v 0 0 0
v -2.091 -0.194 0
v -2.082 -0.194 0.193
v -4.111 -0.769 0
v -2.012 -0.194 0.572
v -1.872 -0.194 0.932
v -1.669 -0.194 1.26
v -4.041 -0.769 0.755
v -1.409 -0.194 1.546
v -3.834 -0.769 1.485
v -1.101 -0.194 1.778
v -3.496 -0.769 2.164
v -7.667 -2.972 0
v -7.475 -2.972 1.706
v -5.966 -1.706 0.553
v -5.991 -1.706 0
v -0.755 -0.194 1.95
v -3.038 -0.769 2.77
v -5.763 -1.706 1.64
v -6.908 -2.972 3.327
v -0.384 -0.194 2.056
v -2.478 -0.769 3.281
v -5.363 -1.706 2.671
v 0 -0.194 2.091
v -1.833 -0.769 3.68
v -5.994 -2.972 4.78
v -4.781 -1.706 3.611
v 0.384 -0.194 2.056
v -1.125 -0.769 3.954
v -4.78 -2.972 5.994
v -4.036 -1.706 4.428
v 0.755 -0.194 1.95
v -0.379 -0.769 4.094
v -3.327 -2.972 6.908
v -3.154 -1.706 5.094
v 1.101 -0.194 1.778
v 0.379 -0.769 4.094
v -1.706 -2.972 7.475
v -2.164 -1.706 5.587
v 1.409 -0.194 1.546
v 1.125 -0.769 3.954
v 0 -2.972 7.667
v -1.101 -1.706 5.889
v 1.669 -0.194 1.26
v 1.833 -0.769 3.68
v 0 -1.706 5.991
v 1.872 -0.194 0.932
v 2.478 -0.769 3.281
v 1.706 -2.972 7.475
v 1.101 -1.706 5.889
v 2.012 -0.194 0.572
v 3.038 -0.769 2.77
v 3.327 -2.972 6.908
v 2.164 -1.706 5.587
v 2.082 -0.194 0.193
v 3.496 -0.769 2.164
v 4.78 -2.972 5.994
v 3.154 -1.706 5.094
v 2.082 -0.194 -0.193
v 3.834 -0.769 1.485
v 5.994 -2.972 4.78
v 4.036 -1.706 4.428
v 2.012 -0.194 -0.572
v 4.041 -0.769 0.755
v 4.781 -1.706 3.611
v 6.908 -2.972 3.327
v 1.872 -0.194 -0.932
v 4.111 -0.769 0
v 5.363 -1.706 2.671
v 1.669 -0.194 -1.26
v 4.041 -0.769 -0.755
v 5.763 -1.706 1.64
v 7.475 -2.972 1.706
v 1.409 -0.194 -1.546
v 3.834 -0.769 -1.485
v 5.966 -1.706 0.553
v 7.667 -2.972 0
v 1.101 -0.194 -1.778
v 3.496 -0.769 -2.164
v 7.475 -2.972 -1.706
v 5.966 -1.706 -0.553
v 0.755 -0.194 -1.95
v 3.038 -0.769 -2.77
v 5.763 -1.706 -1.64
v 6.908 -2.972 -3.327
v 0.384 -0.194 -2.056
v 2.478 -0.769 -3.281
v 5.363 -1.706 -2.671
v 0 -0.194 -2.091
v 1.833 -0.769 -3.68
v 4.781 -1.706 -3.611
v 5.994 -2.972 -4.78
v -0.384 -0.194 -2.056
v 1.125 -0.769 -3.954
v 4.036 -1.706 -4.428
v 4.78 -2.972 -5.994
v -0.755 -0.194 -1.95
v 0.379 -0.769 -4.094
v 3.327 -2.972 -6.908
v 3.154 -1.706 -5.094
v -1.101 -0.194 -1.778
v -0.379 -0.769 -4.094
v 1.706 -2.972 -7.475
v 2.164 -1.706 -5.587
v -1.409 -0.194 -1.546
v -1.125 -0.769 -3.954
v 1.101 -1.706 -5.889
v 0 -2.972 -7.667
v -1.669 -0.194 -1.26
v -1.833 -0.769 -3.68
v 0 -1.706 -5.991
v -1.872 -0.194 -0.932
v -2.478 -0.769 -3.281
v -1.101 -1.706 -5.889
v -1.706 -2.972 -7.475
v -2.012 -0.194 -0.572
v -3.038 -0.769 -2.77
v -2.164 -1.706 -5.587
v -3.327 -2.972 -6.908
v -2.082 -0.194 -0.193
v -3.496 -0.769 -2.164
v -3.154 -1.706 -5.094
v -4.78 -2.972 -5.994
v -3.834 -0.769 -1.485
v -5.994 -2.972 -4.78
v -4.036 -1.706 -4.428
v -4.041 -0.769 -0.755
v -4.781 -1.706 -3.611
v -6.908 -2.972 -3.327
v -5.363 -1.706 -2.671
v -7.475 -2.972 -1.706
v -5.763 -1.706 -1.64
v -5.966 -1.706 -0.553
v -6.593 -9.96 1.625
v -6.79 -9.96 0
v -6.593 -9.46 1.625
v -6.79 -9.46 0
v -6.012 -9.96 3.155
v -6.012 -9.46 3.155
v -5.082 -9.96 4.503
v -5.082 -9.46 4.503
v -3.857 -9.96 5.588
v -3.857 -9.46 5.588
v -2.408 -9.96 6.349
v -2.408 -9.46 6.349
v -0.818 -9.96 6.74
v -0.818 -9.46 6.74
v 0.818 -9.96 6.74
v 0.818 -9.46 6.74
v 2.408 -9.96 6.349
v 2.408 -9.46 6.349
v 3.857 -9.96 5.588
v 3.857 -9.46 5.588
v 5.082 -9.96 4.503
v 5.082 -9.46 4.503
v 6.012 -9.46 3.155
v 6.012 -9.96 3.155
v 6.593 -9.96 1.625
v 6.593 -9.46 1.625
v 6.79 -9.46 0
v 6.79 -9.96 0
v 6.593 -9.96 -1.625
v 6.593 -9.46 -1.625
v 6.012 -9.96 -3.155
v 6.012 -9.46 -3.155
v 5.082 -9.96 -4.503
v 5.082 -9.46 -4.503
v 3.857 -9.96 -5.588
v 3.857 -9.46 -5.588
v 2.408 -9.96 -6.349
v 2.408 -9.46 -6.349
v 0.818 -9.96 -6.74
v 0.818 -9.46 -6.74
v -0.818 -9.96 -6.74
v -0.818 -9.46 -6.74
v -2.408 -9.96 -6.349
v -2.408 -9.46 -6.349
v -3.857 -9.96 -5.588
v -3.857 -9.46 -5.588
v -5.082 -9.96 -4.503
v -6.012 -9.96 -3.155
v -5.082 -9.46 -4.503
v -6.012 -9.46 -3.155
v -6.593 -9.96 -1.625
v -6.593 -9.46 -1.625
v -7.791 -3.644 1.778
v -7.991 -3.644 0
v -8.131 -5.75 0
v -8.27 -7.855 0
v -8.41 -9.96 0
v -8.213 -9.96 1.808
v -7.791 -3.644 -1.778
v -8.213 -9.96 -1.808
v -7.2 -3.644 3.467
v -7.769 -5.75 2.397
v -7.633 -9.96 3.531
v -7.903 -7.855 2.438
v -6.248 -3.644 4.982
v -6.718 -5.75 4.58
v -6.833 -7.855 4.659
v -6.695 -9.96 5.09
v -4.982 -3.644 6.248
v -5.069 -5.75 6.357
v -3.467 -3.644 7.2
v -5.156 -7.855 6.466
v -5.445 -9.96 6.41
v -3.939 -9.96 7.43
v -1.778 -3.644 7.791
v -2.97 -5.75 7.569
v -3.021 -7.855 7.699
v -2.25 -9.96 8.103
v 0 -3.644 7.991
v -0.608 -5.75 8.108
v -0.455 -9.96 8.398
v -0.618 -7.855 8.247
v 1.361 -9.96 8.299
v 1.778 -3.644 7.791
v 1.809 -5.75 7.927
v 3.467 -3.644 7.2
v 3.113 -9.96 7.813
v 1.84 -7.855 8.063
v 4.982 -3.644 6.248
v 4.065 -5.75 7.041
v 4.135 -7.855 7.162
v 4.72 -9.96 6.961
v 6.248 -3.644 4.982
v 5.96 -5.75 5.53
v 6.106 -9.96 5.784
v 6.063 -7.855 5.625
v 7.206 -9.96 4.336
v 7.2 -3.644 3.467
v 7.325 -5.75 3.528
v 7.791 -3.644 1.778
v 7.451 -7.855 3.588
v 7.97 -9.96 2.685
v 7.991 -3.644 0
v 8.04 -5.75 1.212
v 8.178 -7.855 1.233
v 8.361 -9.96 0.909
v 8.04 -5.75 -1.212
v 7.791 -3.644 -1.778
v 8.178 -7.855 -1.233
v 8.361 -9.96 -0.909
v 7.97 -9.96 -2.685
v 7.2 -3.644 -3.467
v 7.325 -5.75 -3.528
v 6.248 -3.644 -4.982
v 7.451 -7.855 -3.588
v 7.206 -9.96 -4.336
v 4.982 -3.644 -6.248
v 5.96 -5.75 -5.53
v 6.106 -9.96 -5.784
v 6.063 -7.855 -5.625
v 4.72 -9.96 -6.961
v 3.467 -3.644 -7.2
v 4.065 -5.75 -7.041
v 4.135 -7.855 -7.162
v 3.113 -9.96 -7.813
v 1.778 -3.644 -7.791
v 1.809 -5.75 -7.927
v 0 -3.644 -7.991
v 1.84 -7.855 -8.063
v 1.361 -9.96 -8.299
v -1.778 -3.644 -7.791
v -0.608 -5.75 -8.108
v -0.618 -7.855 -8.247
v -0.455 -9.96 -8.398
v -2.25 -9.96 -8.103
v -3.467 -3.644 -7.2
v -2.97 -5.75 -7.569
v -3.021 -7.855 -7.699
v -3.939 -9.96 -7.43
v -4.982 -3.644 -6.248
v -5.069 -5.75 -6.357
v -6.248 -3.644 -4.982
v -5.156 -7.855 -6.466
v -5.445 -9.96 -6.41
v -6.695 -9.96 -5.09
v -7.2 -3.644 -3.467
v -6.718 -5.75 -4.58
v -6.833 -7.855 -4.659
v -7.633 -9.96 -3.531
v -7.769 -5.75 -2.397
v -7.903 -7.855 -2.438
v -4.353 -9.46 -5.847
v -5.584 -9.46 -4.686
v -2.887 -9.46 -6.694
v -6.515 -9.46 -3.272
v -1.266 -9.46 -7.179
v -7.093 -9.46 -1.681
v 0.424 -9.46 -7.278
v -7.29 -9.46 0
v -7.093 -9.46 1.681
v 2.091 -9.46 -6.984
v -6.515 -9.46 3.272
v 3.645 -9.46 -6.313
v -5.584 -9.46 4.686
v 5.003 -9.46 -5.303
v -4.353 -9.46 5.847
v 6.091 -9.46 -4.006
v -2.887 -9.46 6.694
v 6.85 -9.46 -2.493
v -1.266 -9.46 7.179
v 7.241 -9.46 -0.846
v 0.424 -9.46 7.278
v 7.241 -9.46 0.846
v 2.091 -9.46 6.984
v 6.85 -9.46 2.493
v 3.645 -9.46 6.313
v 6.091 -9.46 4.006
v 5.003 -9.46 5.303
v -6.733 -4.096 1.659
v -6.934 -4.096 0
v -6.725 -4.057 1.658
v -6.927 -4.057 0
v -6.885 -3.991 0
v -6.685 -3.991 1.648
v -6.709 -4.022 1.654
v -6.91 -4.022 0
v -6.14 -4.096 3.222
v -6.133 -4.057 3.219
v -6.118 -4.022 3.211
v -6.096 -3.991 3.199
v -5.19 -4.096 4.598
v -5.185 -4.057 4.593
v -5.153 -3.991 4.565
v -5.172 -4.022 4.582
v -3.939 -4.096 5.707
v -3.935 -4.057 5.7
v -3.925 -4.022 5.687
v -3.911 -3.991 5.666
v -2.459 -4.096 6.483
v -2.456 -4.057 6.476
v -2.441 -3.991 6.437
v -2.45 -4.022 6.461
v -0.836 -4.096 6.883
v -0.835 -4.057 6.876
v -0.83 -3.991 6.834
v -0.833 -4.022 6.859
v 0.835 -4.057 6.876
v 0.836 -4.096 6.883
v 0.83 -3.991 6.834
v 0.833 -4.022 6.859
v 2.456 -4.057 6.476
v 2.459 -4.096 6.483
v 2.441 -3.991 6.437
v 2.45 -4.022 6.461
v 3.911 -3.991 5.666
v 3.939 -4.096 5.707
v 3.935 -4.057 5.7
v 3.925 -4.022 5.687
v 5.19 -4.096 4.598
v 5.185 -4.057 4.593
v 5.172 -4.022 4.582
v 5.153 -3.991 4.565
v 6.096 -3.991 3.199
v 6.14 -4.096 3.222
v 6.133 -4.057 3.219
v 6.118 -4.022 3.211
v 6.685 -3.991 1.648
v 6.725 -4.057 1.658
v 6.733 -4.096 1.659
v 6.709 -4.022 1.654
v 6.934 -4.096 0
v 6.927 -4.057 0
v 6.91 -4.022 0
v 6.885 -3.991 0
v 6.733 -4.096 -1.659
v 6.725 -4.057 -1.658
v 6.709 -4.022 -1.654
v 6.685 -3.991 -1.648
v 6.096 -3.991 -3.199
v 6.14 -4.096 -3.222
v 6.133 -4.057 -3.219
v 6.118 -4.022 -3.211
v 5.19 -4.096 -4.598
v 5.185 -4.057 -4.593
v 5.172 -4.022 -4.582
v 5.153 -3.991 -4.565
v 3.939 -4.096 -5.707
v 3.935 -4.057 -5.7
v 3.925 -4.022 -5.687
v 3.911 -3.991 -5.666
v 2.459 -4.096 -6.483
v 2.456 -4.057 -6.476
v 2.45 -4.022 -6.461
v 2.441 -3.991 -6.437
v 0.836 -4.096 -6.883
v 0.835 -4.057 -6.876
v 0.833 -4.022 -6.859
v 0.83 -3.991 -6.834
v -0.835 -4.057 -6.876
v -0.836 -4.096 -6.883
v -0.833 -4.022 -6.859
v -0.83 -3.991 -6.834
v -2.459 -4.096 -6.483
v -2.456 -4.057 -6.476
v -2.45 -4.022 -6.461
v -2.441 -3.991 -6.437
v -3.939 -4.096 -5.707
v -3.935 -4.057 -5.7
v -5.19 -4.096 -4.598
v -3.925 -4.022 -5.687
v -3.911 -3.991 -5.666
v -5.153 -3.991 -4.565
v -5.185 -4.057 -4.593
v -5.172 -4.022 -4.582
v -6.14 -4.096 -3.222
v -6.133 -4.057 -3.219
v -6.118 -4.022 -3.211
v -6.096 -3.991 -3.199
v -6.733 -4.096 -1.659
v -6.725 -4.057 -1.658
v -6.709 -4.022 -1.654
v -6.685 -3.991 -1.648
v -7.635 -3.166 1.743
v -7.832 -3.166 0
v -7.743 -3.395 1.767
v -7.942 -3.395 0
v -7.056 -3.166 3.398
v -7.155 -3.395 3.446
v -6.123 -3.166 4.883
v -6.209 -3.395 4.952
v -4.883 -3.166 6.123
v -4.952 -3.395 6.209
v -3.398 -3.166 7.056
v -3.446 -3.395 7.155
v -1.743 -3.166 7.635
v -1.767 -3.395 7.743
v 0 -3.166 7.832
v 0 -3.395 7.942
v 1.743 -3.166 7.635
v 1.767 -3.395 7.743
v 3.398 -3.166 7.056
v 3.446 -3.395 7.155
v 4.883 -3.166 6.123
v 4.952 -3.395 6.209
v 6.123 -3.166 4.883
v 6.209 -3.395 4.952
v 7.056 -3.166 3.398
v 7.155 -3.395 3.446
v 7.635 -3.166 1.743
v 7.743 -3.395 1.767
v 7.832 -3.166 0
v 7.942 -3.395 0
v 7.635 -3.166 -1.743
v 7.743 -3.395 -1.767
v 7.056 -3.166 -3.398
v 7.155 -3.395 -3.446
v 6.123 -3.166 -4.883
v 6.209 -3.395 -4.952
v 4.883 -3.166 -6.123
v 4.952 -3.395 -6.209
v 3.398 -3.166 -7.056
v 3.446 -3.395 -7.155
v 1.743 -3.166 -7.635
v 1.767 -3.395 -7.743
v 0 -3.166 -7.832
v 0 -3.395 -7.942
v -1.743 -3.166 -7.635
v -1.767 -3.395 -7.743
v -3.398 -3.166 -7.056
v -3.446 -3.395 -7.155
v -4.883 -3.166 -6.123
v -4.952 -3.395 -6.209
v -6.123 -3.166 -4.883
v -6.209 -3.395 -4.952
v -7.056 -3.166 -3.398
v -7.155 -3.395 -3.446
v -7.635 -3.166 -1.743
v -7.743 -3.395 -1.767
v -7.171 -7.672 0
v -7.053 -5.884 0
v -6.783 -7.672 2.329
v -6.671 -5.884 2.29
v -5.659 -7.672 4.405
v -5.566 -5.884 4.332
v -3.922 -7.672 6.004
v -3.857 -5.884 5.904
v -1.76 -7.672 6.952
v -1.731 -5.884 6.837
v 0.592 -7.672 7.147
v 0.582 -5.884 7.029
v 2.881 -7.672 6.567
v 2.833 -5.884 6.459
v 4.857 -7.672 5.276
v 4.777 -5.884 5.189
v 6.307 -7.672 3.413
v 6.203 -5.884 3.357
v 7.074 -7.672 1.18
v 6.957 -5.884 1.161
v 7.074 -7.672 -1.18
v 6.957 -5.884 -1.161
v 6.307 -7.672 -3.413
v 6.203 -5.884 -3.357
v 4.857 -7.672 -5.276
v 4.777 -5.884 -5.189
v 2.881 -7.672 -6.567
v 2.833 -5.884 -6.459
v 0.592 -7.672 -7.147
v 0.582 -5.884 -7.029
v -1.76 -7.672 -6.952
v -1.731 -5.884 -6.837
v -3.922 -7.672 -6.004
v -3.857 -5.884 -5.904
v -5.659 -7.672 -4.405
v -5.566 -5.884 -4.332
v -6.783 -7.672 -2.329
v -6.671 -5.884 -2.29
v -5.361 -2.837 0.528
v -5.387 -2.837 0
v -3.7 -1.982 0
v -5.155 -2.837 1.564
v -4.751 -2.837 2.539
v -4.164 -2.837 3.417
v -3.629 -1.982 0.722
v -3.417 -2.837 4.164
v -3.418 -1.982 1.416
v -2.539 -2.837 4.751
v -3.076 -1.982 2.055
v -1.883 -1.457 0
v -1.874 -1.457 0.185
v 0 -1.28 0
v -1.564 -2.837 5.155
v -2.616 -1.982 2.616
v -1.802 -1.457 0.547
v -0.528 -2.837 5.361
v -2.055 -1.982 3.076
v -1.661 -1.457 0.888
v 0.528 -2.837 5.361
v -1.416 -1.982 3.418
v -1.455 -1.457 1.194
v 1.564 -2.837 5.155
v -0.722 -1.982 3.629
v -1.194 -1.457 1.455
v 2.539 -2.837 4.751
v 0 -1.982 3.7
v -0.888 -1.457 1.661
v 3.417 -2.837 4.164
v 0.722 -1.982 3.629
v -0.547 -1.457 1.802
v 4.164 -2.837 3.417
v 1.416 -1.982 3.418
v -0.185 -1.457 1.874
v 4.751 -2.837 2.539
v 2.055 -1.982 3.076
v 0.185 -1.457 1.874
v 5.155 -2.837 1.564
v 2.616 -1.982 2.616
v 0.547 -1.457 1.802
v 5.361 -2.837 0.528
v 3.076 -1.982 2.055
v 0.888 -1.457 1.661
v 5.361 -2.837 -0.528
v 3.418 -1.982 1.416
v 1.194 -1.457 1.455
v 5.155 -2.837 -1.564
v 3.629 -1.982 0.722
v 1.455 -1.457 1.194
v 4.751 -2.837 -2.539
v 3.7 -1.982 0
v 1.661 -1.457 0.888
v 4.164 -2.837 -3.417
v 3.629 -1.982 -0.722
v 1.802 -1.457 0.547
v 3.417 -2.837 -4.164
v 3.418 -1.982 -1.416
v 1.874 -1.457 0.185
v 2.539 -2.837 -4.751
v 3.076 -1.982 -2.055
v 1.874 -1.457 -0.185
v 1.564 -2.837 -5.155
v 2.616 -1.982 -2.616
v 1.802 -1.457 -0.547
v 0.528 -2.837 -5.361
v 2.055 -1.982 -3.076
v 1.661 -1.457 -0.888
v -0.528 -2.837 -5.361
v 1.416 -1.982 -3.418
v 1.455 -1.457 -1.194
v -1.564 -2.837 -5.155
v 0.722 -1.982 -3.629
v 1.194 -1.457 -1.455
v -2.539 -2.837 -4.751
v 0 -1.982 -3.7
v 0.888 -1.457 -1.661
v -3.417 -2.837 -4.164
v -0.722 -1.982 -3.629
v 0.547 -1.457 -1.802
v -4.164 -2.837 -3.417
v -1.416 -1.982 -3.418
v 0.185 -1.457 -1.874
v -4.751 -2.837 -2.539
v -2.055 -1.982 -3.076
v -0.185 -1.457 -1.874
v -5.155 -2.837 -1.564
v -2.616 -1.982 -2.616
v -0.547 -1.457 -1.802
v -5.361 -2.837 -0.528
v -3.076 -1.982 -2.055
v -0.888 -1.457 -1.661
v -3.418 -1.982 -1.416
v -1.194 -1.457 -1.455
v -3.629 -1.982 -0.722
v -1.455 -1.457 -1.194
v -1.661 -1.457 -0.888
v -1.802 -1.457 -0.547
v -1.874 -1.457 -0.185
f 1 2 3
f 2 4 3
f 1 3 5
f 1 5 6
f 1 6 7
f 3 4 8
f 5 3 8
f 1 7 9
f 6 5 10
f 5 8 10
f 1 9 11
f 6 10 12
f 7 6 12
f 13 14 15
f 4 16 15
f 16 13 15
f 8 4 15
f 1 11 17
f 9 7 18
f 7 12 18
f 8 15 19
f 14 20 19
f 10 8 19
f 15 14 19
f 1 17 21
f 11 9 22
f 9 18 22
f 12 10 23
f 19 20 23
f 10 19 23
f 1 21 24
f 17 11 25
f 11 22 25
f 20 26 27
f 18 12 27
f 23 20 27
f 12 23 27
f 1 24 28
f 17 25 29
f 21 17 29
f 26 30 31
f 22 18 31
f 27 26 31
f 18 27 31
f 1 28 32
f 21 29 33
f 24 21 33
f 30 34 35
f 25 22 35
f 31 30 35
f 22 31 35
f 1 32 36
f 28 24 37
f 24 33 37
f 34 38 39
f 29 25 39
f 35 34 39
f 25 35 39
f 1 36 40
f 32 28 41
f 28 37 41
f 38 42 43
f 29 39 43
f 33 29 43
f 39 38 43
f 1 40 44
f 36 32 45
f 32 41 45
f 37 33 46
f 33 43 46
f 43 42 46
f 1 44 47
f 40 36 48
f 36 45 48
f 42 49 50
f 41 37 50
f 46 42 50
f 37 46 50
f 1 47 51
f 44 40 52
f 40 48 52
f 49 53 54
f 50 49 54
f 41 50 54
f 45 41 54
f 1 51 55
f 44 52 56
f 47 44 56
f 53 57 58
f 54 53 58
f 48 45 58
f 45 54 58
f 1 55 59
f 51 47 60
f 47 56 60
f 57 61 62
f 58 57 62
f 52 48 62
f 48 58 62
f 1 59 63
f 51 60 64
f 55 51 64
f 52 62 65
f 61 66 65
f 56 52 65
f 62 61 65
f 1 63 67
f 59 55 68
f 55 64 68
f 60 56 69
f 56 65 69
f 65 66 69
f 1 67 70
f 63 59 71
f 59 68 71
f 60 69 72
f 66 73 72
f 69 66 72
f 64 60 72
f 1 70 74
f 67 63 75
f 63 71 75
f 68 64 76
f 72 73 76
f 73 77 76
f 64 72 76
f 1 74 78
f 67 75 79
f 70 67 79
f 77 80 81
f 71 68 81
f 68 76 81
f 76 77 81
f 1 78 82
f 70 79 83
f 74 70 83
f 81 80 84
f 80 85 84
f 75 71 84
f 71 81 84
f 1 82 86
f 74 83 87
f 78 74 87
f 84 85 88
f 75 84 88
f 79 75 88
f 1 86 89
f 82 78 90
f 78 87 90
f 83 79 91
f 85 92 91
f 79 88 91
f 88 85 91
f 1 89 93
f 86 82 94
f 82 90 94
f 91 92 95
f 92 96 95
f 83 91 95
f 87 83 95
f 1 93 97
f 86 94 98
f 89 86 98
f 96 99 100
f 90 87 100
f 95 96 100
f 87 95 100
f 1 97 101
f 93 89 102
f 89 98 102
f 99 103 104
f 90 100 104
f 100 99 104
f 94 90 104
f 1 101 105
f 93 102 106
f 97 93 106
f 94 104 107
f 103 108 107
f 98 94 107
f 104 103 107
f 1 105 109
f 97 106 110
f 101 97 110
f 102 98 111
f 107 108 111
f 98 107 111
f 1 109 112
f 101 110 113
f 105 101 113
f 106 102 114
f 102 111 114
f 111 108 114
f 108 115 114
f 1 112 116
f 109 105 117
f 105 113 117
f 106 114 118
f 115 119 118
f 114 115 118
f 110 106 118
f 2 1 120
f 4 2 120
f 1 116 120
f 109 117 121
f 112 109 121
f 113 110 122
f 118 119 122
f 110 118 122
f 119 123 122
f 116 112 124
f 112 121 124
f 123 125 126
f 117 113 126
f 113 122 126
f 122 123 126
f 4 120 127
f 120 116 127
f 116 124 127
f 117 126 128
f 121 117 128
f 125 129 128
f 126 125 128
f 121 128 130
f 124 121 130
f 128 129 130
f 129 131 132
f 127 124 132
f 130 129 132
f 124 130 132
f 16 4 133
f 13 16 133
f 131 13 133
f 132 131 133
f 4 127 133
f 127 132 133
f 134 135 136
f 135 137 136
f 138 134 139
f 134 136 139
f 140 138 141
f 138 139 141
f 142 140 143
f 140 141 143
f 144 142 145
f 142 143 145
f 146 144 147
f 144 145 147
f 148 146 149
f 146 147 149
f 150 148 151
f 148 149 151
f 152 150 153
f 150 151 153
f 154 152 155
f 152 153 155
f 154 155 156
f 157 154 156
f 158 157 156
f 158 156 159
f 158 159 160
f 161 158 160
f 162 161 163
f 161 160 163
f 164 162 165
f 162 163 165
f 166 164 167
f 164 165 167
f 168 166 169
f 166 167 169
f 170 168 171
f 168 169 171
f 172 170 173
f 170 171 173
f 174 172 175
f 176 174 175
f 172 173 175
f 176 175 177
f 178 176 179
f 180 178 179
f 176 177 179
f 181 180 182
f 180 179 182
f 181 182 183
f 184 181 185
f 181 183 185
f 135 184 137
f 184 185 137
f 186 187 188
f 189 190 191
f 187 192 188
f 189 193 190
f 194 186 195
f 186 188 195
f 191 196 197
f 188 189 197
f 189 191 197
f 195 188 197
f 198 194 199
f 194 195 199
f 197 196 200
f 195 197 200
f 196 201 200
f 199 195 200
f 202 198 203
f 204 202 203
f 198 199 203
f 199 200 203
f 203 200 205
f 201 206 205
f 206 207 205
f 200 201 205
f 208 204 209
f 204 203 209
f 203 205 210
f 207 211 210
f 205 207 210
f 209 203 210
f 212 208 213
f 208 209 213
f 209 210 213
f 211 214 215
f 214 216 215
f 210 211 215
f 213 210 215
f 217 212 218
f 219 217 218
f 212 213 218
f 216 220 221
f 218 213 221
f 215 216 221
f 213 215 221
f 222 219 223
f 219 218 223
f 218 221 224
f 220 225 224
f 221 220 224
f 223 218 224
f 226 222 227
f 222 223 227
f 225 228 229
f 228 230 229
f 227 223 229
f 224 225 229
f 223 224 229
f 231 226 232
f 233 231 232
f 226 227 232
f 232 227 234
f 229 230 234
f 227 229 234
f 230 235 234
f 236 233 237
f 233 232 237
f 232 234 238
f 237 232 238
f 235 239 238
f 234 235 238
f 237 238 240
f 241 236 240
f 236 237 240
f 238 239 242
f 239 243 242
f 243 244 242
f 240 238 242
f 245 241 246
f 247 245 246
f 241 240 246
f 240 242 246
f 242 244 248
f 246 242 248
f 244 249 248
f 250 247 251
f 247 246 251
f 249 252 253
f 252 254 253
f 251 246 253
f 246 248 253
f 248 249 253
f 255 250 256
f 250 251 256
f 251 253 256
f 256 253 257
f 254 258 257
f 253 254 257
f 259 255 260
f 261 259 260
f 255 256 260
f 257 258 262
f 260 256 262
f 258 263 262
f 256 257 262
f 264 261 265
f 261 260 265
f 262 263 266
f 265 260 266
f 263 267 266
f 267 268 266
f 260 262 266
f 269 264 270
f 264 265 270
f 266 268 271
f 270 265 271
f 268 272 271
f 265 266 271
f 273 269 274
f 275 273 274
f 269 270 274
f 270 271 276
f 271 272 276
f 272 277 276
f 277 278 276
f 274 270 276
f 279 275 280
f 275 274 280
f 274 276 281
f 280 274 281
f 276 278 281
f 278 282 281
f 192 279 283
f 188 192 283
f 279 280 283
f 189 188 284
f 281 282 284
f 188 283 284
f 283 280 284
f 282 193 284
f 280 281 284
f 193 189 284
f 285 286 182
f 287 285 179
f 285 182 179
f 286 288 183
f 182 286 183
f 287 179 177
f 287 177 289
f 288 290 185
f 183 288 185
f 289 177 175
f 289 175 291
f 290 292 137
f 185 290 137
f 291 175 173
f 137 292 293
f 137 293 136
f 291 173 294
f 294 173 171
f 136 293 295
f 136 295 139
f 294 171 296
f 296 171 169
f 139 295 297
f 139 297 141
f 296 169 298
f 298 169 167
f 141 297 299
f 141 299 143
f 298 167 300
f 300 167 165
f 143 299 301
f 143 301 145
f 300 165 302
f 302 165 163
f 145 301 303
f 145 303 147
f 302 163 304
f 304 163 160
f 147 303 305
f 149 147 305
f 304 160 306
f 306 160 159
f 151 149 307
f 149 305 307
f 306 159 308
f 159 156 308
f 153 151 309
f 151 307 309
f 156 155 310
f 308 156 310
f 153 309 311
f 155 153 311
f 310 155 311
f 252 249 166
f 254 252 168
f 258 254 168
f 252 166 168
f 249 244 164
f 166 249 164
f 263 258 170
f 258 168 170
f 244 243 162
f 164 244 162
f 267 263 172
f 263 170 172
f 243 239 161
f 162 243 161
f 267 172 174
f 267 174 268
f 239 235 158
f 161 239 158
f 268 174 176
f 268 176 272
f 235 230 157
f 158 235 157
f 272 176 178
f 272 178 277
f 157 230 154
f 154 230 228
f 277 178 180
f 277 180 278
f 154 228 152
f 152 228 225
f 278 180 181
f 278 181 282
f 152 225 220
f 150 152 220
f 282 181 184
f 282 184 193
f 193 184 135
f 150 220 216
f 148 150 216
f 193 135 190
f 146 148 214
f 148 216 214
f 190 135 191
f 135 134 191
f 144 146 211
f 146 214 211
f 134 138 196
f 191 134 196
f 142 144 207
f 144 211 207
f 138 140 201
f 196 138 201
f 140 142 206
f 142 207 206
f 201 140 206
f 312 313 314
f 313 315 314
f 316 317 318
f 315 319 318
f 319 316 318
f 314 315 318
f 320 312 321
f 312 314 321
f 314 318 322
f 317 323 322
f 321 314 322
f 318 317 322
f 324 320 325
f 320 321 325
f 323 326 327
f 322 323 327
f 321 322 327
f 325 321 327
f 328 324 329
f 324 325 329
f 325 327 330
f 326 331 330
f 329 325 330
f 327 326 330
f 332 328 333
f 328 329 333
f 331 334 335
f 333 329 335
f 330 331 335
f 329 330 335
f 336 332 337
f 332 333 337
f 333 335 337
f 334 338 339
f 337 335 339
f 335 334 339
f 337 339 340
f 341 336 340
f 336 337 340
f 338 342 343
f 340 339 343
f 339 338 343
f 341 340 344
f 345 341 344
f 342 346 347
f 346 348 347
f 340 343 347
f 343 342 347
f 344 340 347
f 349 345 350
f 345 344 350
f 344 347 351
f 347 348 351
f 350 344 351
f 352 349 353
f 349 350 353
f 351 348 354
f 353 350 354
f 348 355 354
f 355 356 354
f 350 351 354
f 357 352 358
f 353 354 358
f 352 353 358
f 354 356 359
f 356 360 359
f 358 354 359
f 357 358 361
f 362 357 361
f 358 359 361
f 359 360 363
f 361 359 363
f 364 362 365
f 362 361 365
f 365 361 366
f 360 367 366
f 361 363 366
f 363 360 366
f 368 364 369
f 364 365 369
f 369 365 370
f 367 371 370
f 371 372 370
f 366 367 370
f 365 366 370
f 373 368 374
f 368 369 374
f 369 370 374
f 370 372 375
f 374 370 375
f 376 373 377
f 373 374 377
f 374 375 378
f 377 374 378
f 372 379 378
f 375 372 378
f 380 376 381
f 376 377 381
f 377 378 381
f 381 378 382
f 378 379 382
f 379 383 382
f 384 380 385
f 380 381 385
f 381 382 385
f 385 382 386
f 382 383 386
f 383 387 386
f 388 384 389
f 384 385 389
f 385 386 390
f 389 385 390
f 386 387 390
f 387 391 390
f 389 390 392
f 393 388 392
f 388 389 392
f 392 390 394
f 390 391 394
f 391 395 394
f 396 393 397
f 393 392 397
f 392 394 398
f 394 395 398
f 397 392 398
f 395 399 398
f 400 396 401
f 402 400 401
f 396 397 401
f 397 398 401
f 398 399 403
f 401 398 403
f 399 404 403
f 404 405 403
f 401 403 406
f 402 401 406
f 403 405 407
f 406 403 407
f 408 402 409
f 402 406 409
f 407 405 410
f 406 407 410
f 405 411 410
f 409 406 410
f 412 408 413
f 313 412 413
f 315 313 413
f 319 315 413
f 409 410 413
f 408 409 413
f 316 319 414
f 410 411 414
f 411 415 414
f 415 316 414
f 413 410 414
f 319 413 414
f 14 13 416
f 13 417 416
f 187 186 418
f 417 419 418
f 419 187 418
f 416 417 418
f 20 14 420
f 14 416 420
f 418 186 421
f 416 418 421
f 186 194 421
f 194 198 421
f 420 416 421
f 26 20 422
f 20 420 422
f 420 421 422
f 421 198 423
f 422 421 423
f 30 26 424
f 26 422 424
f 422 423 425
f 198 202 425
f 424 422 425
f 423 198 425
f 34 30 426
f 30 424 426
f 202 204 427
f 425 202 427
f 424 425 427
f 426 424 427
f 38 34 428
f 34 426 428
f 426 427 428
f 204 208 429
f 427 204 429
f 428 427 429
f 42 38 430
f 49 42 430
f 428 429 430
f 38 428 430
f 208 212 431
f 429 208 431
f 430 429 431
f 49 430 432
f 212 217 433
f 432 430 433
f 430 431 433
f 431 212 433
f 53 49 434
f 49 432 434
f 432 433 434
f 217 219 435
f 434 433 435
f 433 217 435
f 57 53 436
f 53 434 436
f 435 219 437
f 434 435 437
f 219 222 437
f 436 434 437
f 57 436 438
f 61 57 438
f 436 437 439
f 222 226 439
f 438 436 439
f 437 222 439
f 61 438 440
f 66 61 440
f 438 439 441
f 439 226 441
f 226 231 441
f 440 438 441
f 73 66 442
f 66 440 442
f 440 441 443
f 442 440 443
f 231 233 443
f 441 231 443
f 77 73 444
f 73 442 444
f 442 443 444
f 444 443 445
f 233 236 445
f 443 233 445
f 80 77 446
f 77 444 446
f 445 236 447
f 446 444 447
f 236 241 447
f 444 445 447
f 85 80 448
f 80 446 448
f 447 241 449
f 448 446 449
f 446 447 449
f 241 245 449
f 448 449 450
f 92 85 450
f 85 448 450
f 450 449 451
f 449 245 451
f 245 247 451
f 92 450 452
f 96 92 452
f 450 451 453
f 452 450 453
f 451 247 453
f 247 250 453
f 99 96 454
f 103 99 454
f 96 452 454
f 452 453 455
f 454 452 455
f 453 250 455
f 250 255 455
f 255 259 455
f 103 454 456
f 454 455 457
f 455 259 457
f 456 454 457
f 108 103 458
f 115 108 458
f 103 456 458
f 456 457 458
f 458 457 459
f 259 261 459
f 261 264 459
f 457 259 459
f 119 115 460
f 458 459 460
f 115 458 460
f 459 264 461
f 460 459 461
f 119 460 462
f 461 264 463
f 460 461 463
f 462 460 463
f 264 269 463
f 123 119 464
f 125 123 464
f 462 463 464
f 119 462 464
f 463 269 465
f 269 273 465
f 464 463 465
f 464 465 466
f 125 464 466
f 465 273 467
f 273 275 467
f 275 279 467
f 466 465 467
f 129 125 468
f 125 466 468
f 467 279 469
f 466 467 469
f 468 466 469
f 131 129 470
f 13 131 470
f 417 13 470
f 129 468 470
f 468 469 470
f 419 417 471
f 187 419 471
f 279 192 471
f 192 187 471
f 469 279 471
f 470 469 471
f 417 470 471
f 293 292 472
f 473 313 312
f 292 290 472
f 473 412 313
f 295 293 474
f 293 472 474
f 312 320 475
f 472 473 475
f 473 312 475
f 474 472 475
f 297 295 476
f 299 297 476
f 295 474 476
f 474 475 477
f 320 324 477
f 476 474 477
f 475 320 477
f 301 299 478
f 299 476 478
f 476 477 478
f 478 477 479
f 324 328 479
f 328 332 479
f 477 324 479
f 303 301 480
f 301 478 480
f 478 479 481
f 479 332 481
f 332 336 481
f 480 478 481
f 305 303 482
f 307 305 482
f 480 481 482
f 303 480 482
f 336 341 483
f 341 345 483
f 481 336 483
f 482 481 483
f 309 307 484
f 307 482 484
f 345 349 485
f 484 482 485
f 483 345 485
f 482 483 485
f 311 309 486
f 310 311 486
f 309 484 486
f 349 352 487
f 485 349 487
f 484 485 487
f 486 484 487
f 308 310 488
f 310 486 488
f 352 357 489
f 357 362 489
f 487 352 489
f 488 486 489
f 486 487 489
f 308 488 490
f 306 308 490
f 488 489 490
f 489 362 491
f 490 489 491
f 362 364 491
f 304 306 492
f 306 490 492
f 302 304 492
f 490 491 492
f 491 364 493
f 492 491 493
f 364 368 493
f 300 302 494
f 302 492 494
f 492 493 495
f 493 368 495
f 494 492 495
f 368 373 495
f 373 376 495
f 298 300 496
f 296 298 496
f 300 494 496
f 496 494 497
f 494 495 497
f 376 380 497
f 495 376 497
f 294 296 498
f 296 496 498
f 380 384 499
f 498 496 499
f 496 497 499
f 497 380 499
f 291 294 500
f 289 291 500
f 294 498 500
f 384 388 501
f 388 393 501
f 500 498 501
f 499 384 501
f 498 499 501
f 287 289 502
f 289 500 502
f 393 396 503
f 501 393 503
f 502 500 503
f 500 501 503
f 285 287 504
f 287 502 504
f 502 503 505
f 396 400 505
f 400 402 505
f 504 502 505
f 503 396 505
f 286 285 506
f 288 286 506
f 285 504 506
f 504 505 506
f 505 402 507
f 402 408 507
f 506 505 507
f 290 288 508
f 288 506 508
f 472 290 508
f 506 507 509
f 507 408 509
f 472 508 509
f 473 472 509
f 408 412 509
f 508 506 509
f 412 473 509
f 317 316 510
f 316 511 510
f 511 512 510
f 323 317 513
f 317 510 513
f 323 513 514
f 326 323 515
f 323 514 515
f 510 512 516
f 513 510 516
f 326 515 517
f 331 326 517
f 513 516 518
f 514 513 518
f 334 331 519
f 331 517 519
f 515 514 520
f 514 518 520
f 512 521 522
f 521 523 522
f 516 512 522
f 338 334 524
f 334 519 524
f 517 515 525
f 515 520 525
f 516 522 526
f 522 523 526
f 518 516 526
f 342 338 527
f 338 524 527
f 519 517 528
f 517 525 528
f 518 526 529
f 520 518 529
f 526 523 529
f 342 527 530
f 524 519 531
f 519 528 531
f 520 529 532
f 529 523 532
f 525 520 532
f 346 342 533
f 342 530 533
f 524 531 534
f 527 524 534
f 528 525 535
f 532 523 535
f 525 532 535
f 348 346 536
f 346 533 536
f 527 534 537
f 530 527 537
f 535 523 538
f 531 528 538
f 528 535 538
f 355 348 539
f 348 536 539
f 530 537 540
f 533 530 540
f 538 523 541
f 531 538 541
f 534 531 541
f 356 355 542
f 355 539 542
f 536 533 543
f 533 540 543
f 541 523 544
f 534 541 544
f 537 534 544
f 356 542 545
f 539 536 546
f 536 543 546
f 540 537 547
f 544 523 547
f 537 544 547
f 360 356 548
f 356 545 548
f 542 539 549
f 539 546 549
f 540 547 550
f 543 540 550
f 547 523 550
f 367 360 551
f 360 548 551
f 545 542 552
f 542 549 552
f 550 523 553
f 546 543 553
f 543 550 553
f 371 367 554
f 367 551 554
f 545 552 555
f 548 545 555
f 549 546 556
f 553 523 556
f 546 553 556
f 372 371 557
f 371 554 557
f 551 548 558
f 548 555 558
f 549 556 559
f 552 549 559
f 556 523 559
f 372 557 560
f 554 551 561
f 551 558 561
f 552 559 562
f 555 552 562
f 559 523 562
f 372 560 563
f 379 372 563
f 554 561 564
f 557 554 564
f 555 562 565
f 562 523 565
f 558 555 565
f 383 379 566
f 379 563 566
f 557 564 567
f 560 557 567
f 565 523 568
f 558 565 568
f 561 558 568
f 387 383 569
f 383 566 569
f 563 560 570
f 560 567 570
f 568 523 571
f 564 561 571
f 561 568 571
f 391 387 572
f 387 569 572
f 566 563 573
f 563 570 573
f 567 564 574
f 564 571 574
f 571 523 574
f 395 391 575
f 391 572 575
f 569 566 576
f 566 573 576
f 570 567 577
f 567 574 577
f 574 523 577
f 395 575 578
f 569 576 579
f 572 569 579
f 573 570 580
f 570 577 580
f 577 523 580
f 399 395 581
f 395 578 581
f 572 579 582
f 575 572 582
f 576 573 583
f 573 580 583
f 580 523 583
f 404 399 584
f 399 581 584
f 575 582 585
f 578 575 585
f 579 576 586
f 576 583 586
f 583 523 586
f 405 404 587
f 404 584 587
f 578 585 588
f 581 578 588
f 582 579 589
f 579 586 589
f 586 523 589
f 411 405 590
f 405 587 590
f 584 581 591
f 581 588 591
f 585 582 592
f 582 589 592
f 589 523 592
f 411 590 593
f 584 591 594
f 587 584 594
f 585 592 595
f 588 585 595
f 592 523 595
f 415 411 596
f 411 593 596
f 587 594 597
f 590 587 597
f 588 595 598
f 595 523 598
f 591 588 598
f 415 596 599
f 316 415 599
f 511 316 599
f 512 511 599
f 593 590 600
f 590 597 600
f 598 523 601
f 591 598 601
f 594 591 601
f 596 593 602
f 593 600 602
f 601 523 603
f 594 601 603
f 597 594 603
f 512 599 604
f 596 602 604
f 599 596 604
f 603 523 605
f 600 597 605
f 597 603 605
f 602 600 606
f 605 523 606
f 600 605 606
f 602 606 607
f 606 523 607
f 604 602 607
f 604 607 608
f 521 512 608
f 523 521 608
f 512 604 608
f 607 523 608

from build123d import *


with BuildPart() as part:
    # Sketch1 → Revolve1 (revolve)
    with BuildSketch(Plane.XY):
        with BuildLine():
            Line((-7.990929537, -3.644388375), (-8.41, -9.96))
            Line((-8.41, -9.96), (-6.89, -9.96))
            Line((-6.89, -9.96), (-6.79, -9.96))
            Line((-6.79, -9.96), (-6.79, -9.46))
            Line((-6.79, -9.46), (-7.29, -9.46))
            Line((-7.29, -9.46), (-6.934045173, -4.095574106))
            ThreePointArc((-6.934045173, -4.095574106), (-6.919243429, -4.038745871), (-6.884556501, -3.991360674))
            ThreePointArc((-6.884556501, -3.991360674), (-3.699614673, -1.98226408), (0, -1.28))
            Line((0, -1.28), (0, 0))
            ThreePointArc((0, 0), (-4.111446691, -0.768945317), (-7.667085246, -2.971830982))
            ThreePointArc((-7.667085246, -2.971830982), (-7.894114775, -3.276759708), (-7.990929537, -3.644388375))
        make_face()
    revolve(axis=Axis((0, 0, 0), (0, 1, 0)))


solid = part.part
